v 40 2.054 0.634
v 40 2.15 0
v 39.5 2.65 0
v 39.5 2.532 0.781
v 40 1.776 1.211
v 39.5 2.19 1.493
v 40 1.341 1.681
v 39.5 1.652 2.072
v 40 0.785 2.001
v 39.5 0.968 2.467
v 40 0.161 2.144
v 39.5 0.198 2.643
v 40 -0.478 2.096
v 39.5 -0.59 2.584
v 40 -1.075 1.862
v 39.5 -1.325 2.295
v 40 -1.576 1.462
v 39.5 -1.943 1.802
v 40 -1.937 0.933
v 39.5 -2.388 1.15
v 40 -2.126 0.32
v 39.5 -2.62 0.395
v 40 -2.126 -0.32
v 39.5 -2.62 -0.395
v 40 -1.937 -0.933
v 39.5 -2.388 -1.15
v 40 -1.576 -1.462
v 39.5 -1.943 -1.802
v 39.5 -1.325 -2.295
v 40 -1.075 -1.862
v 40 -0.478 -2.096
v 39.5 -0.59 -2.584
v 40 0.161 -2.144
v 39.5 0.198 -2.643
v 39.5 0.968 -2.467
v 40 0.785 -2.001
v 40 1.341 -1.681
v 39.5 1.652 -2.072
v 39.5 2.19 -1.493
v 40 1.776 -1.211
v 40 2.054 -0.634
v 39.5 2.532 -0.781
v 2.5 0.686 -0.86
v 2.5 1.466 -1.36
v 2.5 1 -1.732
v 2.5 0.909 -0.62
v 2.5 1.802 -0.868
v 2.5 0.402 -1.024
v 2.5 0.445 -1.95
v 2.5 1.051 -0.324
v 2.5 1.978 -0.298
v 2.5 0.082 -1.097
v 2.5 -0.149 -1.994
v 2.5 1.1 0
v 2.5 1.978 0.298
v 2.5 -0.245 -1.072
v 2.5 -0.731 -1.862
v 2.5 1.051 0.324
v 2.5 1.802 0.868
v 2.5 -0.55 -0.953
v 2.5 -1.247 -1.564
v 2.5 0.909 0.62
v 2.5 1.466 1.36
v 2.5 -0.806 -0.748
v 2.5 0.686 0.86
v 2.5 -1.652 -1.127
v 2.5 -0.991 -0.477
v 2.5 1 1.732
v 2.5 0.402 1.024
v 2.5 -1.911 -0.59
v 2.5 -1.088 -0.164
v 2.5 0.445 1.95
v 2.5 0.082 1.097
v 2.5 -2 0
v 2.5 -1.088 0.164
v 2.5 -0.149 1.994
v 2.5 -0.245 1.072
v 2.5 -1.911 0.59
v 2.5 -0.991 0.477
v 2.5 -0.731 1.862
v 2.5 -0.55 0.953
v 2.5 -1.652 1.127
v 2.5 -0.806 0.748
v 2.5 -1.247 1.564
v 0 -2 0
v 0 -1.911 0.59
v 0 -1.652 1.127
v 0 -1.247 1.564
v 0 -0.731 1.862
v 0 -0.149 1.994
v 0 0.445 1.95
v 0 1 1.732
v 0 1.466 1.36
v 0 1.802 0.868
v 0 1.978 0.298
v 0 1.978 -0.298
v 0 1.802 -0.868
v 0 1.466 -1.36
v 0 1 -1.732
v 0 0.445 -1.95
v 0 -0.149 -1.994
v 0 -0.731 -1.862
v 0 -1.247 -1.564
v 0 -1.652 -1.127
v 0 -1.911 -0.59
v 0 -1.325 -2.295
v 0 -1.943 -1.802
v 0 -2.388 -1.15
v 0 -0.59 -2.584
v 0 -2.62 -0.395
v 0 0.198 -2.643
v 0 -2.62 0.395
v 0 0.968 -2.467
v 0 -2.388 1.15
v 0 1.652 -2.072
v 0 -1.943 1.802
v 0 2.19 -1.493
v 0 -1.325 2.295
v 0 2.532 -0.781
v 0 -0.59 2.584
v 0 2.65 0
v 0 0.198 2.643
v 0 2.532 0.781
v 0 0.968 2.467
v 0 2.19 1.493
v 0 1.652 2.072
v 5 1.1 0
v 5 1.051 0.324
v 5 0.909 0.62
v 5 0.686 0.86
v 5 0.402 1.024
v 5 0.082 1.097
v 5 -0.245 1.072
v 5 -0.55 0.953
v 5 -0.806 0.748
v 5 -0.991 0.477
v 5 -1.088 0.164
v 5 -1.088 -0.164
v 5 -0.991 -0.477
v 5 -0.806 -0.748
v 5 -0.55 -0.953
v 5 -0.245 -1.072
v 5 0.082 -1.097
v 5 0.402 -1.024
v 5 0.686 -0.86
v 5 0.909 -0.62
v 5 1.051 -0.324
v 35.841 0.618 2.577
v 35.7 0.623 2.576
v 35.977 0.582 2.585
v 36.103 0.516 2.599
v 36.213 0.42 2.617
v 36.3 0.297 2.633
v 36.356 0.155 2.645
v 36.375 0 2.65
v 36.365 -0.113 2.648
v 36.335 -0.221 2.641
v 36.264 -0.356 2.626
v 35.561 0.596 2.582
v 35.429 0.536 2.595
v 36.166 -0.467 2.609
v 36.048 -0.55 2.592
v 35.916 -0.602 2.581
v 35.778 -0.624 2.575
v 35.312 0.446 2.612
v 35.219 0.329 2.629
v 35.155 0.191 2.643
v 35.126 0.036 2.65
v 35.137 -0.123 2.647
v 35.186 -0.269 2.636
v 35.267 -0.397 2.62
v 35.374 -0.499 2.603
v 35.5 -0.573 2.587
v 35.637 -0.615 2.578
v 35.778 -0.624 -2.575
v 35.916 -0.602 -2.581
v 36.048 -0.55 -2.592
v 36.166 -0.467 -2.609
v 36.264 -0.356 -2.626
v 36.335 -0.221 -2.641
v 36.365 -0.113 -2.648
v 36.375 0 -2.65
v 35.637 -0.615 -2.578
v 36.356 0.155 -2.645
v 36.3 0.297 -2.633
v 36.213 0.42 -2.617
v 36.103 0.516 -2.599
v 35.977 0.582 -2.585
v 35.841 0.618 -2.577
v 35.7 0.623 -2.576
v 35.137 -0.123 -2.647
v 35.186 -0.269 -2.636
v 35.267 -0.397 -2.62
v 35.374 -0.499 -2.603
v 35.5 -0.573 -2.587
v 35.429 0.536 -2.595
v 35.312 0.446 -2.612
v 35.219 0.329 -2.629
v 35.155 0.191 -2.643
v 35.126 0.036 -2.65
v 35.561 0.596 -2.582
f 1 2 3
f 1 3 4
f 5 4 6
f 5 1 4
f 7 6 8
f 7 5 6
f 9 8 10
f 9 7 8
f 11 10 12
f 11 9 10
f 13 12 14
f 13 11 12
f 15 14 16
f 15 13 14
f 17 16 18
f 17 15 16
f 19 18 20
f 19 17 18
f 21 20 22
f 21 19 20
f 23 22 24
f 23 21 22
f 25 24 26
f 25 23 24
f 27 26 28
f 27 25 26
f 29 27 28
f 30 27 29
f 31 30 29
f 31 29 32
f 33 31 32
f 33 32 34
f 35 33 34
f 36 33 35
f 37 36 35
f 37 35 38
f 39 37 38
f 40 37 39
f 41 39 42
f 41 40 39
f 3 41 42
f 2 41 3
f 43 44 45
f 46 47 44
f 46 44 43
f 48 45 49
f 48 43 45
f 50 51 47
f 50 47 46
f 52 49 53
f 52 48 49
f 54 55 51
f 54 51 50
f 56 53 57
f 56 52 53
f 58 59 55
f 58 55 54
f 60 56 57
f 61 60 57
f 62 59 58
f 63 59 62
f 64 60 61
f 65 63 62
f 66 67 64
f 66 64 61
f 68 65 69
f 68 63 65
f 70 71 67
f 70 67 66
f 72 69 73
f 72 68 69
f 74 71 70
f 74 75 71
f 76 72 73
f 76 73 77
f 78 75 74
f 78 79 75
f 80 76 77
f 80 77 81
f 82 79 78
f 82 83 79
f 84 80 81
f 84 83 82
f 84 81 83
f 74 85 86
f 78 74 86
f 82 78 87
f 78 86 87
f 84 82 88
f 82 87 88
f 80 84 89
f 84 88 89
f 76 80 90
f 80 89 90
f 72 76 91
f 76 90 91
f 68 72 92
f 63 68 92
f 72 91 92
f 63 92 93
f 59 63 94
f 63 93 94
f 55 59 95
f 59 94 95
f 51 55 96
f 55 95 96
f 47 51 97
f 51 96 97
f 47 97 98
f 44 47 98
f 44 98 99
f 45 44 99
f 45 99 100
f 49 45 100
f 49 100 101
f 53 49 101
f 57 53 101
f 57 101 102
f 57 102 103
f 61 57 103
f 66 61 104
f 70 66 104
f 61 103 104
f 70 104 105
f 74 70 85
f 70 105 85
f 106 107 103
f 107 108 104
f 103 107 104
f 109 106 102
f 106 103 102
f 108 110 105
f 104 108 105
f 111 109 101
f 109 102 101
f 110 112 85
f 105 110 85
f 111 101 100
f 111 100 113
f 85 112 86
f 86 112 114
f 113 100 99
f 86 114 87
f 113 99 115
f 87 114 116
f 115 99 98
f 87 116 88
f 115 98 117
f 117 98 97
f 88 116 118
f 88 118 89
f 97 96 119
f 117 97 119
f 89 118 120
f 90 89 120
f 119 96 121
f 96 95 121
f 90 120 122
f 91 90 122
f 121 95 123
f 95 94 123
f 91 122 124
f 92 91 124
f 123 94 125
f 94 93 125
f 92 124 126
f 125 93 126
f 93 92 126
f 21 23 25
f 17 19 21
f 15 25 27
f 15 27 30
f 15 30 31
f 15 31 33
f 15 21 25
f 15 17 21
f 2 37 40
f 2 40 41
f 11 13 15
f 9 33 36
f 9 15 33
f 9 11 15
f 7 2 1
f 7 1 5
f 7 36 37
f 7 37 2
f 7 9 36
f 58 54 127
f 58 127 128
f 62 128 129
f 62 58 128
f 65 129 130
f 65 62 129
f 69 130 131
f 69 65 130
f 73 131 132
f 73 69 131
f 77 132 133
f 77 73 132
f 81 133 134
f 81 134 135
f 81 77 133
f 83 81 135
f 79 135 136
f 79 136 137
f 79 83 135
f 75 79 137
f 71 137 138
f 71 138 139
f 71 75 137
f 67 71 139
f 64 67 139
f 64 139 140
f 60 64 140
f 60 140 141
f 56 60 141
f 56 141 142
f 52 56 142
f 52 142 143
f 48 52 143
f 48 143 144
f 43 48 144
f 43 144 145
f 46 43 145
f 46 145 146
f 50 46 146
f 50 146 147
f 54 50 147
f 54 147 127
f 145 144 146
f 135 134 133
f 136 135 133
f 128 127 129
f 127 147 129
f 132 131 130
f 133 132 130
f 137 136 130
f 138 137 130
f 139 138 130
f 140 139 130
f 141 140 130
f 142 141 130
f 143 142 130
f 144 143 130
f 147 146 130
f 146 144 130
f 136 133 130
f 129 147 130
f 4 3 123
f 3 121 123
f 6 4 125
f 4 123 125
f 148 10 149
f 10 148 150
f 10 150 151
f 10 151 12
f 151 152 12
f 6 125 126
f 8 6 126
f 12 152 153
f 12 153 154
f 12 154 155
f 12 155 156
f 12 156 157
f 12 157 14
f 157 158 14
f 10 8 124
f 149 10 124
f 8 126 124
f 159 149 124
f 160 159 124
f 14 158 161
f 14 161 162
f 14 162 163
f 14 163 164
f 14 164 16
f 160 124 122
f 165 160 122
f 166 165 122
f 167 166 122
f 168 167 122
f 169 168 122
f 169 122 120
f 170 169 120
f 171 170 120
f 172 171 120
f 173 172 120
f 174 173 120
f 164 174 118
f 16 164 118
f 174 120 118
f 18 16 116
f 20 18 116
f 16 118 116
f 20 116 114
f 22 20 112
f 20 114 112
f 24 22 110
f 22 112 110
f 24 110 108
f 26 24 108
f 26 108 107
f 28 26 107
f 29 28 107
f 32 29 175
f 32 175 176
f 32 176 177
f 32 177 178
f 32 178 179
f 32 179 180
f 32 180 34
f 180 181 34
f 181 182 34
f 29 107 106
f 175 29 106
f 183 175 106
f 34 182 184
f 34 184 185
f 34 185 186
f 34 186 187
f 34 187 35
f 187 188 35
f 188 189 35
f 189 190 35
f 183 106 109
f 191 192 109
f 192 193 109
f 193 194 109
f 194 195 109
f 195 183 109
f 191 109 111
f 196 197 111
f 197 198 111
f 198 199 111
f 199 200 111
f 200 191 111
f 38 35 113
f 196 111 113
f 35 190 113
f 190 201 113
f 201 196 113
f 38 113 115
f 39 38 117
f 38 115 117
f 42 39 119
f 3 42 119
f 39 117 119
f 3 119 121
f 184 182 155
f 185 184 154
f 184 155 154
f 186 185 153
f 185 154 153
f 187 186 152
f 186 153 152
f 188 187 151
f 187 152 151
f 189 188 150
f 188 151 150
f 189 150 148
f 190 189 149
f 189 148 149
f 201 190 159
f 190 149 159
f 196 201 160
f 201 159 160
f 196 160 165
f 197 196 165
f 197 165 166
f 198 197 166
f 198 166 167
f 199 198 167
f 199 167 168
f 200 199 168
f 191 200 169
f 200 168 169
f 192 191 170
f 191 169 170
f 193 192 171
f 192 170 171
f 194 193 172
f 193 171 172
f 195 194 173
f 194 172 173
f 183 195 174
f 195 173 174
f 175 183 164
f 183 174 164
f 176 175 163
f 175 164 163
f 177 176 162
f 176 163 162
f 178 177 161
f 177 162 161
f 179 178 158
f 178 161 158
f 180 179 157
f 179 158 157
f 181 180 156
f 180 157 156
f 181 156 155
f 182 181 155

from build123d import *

# Parameters (mm, degrees)
F0_R     = 2.65
F1_DEPTH = 40
F2_R     = 1.1
F3_DEPTH = 5
F4_SIZE  = 0.5
F5_R     = 0.625
F6_DEPTH = 12.5
F7_R     = 2
F8_DEPTH = 2.5


with BuildPart() as f1:
    # F0 (on Right) → F1 (new body)
    with BuildSketch(Plane.YZ):
        Circle(F0_R)
    extrude(amount=F1_DEPTH)

    # F2 (on Right) → F3 (cut)
    with BuildSketch(Plane.YZ):
        Circle(F2_R)
    extrude(amount=F3_DEPTH, mode=Mode.SUBTRACT)

    # F4
    f4_edges = [f1.edges().sort_by_distance(p)[0] for p in [
        (40, -2.65, 0),
    ]]
    chamfer(f4_edges, length=F4_SIZE)

    # F5 (on Top) → F6 (cut, symmetric)
    with BuildSketch(Plane.XY):
        with Locations((35.75, 0)):
            Circle(F5_R)
    extrude(amount=F6_DEPTH, both=True, mode=Mode.SUBTRACT)

    # F7 (on face) → F8 (cut)
    with BuildSketch(Plane(origin=(0, 0, 0), x_dir=(0, -1, 0), z_dir=(-1, 0, 0))):
        Circle(F7_R)
    extrude(amount=-F8_DEPTH, mode=Mode.SUBTRACT)


solid = f1.part
